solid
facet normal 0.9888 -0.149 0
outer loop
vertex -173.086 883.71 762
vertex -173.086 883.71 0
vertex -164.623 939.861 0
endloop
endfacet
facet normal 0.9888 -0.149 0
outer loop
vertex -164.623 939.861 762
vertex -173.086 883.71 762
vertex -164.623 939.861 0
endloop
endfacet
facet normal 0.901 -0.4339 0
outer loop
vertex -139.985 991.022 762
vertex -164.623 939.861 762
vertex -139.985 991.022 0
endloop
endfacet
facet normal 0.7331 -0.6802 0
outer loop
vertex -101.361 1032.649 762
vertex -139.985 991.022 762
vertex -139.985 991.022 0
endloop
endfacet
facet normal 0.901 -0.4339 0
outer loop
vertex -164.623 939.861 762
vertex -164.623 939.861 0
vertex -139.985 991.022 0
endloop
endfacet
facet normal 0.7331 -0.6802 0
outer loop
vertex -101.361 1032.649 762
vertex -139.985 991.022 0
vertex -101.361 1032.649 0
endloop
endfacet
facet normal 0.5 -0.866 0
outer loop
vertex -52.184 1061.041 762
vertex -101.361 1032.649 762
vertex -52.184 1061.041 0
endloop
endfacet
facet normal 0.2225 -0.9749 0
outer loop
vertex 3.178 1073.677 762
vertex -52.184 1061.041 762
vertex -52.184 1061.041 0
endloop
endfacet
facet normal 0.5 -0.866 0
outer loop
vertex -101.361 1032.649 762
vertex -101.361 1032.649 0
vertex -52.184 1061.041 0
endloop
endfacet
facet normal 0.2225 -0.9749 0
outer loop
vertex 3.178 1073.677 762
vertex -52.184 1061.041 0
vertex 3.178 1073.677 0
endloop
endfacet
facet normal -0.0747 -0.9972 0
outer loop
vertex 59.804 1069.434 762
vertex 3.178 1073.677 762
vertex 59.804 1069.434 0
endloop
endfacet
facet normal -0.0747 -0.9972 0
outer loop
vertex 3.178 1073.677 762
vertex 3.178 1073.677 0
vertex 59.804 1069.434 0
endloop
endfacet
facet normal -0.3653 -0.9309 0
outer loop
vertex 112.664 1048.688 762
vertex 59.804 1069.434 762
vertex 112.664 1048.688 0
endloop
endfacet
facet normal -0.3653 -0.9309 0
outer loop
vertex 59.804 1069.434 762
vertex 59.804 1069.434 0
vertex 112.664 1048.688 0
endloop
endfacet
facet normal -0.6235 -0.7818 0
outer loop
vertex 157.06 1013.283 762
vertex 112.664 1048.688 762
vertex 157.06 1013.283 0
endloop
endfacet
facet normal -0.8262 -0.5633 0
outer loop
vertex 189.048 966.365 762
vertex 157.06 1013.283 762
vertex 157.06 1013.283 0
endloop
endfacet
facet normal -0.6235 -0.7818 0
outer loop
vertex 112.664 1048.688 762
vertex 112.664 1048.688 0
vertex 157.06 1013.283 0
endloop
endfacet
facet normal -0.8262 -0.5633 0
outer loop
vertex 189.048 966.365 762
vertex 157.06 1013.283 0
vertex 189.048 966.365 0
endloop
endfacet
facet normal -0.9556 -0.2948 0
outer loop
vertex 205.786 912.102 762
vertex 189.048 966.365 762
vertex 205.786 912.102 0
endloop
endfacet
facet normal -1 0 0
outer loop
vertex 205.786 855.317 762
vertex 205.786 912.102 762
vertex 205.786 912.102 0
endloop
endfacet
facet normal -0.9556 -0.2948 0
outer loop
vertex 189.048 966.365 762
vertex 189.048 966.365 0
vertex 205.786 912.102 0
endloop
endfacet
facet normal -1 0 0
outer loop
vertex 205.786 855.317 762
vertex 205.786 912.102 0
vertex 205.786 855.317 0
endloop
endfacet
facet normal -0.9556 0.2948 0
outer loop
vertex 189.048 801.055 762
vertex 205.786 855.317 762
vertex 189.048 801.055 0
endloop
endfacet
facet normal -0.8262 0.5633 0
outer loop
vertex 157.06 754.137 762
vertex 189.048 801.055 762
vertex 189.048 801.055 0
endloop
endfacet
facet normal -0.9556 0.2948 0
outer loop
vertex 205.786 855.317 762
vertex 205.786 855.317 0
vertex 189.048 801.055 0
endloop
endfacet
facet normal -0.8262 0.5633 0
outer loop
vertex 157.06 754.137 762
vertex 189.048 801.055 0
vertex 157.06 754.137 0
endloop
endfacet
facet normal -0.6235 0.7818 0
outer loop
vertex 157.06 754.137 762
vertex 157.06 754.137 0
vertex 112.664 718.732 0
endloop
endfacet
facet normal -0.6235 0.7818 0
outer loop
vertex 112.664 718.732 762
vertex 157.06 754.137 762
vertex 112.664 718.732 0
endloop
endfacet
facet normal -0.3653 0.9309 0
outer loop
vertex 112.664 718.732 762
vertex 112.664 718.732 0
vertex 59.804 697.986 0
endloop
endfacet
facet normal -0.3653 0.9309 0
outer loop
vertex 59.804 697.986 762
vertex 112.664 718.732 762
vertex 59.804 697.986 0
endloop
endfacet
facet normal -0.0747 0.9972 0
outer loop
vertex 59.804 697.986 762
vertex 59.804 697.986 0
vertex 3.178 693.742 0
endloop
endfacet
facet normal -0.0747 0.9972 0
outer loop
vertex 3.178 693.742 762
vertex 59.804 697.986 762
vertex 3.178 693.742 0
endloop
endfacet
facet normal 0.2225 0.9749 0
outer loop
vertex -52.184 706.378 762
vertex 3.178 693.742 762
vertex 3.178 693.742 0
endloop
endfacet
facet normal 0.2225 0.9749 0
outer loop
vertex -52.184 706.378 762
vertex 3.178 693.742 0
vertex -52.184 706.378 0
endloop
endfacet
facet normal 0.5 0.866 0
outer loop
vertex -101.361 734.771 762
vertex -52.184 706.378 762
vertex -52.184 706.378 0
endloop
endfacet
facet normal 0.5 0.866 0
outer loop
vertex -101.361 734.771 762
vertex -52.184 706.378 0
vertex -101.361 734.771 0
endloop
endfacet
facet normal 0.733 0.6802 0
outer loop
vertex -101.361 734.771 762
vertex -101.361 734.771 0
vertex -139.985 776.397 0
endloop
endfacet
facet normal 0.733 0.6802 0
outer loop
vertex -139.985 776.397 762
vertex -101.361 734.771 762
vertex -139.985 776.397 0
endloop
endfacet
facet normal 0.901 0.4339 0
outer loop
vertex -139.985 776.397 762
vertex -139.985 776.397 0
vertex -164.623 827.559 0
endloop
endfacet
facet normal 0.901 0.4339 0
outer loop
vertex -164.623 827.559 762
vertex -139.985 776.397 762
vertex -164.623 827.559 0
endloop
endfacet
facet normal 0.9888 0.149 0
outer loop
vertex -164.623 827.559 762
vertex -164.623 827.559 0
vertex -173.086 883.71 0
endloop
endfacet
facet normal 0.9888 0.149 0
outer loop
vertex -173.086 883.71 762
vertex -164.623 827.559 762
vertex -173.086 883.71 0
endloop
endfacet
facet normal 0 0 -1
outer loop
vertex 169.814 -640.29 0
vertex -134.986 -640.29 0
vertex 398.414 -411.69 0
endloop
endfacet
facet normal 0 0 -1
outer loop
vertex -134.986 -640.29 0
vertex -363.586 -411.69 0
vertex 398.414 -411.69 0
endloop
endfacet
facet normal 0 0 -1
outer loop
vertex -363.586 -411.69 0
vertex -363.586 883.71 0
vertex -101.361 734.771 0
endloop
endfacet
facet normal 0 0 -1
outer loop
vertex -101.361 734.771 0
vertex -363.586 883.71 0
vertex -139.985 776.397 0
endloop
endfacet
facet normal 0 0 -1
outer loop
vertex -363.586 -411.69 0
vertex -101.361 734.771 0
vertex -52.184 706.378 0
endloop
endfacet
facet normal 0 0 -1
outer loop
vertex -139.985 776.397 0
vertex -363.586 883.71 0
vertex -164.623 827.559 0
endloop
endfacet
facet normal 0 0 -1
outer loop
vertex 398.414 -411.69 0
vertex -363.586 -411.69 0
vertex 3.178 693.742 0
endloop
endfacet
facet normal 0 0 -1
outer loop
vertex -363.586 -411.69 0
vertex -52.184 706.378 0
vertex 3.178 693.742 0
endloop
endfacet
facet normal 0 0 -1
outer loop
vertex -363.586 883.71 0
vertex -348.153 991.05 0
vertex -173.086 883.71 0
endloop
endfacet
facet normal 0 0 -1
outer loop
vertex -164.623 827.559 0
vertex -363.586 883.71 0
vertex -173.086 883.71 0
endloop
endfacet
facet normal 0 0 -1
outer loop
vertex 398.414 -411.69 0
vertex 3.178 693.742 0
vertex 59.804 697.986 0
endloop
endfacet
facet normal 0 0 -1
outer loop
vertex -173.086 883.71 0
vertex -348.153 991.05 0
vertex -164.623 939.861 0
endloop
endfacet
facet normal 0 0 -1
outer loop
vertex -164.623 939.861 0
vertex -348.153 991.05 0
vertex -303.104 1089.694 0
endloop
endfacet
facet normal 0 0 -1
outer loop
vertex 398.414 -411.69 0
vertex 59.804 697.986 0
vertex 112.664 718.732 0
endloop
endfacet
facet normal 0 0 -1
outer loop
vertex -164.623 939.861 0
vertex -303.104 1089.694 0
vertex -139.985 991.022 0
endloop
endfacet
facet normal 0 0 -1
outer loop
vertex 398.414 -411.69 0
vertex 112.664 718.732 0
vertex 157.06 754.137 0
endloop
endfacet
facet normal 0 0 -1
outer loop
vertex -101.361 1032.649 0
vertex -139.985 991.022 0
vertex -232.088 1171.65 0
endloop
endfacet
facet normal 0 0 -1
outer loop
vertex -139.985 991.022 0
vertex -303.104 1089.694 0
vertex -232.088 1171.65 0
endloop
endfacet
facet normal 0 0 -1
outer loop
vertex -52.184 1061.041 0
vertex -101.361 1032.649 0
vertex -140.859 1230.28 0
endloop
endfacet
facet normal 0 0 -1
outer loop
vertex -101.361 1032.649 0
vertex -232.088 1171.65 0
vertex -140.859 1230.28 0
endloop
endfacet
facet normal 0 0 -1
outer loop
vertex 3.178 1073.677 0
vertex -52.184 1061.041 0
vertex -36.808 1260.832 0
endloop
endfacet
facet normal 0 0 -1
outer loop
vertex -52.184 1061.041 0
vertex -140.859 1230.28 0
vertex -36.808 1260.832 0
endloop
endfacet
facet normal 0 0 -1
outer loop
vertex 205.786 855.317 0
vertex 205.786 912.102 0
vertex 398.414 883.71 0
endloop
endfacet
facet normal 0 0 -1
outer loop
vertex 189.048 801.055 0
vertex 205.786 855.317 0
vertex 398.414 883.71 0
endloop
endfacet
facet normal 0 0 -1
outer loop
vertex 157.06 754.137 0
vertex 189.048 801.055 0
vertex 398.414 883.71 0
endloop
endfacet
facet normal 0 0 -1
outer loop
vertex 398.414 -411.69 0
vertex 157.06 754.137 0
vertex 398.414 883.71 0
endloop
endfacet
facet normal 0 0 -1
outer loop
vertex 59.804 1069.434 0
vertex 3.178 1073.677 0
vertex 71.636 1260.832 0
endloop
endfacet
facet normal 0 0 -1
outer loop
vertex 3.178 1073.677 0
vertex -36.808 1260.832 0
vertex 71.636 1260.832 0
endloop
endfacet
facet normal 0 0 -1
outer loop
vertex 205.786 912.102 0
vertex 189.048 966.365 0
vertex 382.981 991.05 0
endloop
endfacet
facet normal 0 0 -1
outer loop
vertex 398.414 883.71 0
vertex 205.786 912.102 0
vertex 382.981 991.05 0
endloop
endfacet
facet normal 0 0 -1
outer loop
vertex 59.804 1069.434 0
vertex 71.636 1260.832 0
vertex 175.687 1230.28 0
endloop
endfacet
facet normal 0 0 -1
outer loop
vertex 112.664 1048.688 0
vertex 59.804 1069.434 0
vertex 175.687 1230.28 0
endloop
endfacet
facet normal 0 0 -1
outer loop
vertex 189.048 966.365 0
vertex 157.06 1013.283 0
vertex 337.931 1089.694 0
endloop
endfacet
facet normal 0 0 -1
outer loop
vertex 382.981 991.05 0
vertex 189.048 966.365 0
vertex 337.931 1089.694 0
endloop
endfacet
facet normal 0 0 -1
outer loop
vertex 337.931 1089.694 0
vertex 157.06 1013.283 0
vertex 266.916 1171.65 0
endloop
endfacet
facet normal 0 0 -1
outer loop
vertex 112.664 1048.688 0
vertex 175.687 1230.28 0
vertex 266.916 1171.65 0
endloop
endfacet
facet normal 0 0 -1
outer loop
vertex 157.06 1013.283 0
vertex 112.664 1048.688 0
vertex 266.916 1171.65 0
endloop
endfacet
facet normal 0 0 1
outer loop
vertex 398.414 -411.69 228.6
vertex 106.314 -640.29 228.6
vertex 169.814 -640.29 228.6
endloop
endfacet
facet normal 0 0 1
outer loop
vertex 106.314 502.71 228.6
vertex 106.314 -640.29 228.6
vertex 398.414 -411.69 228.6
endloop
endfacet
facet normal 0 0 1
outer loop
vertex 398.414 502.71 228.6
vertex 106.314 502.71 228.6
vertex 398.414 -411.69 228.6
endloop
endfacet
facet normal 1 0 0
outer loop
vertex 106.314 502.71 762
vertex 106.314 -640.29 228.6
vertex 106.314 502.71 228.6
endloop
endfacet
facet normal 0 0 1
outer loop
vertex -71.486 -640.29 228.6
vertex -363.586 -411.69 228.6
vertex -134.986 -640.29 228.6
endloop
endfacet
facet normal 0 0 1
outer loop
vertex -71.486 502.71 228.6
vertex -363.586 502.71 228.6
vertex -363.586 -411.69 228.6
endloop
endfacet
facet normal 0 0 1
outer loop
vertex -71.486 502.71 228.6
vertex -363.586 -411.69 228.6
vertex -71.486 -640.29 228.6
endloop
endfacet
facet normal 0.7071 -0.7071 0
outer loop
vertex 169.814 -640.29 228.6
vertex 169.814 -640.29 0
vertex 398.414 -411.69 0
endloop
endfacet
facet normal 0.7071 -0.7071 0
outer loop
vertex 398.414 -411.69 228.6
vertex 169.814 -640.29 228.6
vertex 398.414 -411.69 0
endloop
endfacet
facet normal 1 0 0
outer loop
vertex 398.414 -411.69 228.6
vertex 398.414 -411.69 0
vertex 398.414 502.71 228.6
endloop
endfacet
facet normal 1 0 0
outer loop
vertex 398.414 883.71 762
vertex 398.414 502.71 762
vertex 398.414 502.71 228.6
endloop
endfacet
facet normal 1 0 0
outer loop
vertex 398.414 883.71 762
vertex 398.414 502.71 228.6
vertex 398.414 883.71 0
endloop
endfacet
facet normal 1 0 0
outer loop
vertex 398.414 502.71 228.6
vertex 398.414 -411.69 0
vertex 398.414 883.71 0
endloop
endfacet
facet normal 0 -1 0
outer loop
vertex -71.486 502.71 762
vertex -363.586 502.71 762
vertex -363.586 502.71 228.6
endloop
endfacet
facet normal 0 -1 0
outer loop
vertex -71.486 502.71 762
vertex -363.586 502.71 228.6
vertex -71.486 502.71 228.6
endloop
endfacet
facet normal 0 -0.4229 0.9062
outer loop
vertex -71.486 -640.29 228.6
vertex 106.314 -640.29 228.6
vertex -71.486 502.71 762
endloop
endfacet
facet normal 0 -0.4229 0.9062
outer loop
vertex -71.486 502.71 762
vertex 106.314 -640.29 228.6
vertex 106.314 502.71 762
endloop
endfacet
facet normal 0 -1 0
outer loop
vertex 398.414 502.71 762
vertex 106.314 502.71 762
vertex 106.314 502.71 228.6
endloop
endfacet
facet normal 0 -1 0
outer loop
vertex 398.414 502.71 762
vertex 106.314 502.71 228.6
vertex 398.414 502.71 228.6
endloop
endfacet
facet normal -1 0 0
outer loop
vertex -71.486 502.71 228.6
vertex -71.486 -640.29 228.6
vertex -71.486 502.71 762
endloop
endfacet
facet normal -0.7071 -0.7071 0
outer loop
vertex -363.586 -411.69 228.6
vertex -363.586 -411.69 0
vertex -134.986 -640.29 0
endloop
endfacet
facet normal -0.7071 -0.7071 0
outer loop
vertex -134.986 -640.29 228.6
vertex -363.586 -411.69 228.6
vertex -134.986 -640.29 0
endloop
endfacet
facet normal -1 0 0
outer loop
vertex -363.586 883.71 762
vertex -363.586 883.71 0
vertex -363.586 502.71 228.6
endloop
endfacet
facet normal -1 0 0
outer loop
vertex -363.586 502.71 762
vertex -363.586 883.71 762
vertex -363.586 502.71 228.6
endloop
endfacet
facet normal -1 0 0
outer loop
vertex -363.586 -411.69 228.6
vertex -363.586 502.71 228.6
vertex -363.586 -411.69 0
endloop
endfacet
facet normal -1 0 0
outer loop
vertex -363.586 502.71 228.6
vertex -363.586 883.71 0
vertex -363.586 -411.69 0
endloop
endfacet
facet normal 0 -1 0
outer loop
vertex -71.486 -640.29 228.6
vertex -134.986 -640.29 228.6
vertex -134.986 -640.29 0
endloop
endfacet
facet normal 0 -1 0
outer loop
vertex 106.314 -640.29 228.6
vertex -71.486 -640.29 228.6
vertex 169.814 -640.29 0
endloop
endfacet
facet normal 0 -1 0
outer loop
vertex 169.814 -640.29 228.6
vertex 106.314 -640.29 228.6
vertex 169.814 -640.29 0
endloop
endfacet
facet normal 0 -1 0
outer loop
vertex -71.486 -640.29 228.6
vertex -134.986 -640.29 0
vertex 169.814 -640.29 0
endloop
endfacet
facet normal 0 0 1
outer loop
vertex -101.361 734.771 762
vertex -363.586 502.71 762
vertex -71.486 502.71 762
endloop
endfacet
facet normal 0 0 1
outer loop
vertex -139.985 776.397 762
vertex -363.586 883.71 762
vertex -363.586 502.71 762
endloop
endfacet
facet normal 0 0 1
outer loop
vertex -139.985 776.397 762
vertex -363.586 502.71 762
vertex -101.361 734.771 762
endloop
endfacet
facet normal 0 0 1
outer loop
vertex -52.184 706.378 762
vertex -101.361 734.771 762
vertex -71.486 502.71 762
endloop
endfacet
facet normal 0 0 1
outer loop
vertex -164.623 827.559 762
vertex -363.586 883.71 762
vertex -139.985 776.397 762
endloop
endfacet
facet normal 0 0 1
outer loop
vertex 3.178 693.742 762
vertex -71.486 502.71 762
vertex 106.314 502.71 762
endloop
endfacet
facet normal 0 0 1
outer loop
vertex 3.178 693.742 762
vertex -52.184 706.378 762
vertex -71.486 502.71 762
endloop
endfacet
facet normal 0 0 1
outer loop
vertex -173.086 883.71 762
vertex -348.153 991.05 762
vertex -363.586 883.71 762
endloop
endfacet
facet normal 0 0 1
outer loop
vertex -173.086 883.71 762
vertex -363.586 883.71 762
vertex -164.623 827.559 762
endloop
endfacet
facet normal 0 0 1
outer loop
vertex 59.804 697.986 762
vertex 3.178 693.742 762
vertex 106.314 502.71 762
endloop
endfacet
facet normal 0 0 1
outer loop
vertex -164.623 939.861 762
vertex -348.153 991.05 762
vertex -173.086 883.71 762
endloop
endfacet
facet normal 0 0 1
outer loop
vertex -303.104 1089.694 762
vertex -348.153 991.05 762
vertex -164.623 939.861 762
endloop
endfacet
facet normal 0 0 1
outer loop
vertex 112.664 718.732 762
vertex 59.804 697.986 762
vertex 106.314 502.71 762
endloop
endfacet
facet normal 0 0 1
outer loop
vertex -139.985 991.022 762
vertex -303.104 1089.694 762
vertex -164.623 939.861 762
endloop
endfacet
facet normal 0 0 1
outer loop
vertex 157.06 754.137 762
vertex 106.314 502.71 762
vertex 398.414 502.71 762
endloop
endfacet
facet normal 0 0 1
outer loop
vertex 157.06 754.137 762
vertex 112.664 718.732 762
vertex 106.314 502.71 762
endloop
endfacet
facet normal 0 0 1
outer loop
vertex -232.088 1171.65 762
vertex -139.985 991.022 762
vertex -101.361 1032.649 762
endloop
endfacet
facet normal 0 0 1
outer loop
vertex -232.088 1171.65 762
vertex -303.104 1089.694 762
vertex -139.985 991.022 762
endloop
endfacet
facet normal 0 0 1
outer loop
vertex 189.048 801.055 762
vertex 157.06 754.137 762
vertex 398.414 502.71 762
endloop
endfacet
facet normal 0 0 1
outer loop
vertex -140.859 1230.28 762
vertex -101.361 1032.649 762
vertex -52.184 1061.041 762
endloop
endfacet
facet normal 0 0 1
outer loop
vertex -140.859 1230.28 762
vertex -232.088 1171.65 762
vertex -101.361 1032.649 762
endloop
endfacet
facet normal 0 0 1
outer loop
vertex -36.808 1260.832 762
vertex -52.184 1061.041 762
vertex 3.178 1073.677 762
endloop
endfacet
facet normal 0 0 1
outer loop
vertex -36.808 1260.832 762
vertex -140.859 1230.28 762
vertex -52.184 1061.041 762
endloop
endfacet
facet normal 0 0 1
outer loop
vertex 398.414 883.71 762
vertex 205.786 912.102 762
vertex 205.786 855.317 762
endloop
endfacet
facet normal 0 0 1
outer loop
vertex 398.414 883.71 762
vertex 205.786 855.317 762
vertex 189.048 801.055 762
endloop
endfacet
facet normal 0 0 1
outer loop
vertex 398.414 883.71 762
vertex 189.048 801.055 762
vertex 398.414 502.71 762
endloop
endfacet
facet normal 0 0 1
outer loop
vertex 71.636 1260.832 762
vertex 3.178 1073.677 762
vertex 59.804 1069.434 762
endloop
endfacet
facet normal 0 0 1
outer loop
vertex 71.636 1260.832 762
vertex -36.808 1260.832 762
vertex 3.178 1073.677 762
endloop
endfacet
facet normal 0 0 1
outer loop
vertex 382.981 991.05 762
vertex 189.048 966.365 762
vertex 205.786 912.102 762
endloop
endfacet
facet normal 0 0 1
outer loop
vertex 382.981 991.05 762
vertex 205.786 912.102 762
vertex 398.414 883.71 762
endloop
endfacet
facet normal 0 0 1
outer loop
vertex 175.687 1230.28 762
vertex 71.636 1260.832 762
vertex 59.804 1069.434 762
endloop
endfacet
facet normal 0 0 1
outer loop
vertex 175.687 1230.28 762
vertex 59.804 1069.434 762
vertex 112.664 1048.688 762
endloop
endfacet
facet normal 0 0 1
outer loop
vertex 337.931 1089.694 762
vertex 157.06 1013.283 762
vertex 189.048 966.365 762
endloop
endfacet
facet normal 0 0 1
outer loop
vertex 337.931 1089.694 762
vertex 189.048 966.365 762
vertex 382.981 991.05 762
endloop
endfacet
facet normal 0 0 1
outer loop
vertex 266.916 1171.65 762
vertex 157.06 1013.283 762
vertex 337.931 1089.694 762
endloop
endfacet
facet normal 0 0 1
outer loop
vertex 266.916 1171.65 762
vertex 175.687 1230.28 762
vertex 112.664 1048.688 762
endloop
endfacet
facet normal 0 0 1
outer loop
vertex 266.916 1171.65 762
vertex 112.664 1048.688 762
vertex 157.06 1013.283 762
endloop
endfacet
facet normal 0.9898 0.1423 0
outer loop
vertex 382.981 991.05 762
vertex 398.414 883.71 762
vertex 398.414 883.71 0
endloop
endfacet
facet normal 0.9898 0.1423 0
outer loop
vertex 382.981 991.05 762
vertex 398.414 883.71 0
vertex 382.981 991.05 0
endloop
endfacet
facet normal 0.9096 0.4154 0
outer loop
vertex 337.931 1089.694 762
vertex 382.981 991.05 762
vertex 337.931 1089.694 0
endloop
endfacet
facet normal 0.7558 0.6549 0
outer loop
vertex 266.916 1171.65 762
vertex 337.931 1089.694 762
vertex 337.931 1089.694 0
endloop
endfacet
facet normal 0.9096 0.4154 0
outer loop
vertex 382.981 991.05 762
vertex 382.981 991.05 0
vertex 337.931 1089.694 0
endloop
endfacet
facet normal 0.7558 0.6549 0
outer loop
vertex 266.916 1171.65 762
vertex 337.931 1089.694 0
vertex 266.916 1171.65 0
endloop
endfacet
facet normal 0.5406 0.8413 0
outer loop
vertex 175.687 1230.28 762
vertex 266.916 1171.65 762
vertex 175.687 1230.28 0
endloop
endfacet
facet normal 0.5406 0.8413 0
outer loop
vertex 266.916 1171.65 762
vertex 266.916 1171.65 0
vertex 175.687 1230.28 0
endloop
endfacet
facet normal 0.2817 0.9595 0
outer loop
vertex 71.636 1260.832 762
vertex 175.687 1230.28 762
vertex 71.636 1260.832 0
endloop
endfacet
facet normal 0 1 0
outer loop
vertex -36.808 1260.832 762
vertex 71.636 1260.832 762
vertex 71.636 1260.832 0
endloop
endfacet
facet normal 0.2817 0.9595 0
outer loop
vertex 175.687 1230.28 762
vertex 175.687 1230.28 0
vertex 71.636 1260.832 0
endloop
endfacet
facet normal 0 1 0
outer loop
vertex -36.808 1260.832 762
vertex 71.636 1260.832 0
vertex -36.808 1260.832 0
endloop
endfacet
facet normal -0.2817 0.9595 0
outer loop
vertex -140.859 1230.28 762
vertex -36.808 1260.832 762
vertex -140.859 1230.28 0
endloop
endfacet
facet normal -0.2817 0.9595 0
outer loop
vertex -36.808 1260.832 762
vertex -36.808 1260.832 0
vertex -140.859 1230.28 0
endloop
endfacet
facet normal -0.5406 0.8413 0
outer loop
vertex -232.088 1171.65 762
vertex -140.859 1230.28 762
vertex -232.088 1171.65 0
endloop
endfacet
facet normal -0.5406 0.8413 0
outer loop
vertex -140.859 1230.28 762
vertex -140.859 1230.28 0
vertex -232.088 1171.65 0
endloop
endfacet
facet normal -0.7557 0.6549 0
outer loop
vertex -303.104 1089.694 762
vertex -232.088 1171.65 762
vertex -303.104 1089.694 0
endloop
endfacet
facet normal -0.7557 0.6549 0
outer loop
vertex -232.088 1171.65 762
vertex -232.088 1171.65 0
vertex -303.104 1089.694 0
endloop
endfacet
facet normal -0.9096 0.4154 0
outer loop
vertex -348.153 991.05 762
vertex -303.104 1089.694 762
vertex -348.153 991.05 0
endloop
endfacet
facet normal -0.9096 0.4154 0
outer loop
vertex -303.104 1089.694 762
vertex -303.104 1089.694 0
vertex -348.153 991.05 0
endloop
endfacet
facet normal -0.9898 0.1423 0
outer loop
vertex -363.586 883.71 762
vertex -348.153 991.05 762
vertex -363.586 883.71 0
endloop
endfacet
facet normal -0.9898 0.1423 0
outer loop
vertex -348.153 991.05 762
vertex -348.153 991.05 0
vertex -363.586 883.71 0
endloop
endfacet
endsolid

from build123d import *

# Parameters (mm, degrees)
F0_W     = 177.8
F0_H     = 1143
F1_DEPTH = 228.6
F2_DEPTH = 762
F4_DEPTH = 177.8


with BuildPart() as f1:
    # F0 (on Top) → F1 (new body)
    with BuildSketch(Plane.XY):
        Polygon((398.4137039741, -411.6901900116), (398.4137039741, 502.7098099884), (106.3137039741, 502.7098099884), (106.3137039741, -640.2901900116), (169.8137039741, -640.2901900116), align=None)
        with BuildLine():
            Line((398.4137039741, 883.7098099884), (207.9137039741, 883.7098099884))
            ThreePointArc((207.9137039741, 883.7098099884), (17.4137039741, 693.2098099884), (-173.0862960259, 883.7098099884))
            Line((-173.0862960259, 883.7098099884), (-363.5862960259, 883.7098099884))
            Line((-363.5862960259, 883.7098099884), (-363.5862960259, 502.7098099884))
            Line((-363.5862960259, 502.7098099884), (-71.4862960259, 502.7098099884))
            Line((-71.4862960259, 502.7098099884), (106.3137039741, 502.7098099884))
            Line((106.3137039741, 502.7098099884), (398.4137039741, 502.7098099884))
            Line((398.4137039741, 502.7098099884), (398.4137039741, 883.7098099884))
        make_face()
        Polygon((-71.4862960259, 502.7098099884), (-363.5862960259, 502.7098099884), (-363.5862960259, -411.6901900116), (-134.9862960259, -640.2901900116), (-71.4862960259, -640.2901900116), align=None)
        with Locations((17.4137039741, -68.7901900116)):
            Rectangle(F0_W, F0_H)
        with BuildLine():
            ThreePointArc((-173.0862960259, 883.7098099884), (17.4137039741, 1074.2098099884), (207.9137039741, 883.7098099884))
            Line((207.9137039741, 883.7098099884), (398.4137039741, 883.7098099884))
            ThreePointArc((398.4137039741, 883.7098099884), (17.4137039741, 1264.7098099884), (-363.5862960259, 883.7098099884))
            Line((-363.5862960259, 883.7098099884), (-173.0862960259, 883.7098099884))
        make_face()
    extrude(amount=F1_DEPTH)

    # F0 (on Top) → F2 (join)
    with BuildSketch(Plane.XY):
        with BuildLine():
            Line((398.4137039741, 883.7098099884), (207.9137039741, 883.7098099884))
            ThreePointArc((207.9137039741, 883.7098099884), (17.4137039741, 693.2098099884), (-173.0862960259, 883.7098099884))
            Line((-173.0862960259, 883.7098099884), (-363.5862960259, 883.7098099884))
            Line((-363.5862960259, 883.7098099884), (-363.5862960259, 502.7098099884))
            Line((-363.5862960259, 502.7098099884), (-71.4862960259, 502.7098099884))
            Line((-71.4862960259, 502.7098099884), (106.3137039741, 502.7098099884))
            Line((106.3137039741, 502.7098099884), (398.4137039741, 502.7098099884))
            Line((398.4137039741, 502.7098099884), (398.4137039741, 883.7098099884))
        make_face()
        with Locations((17.4137039741, -68.7901900116)):
            Rectangle(F0_W, F0_H)
        with BuildLine():
            ThreePointArc((-173.0862960259, 883.7098099884), (17.4137039741, 1074.2098099884), (207.9137039741, 883.7098099884))
            Line((207.9137039741, 883.7098099884), (398.4137039741, 883.7098099884))
            ThreePointArc((398.4137039741, 883.7098099884), (17.4137039741, 1264.7098099884), (-363.5862960259, 883.7098099884))
            Line((-363.5862960259, 883.7098099884), (-173.0862960259, 883.7098099884))
        make_face()
    extrude(amount=F2_DEPTH)

    # F3 (on face) → F4 (cut)
    with BuildSketch(Plane.YZ.offset(106.3137039741)):
        Polygon((-640.2901900116, 762), (-640.2901900116, 228.6), (502.7098099884, 762), align=None)
    extrude(amount=-F4_DEPTH, mode=Mode.SUBTRACT)


solid = f1.part
